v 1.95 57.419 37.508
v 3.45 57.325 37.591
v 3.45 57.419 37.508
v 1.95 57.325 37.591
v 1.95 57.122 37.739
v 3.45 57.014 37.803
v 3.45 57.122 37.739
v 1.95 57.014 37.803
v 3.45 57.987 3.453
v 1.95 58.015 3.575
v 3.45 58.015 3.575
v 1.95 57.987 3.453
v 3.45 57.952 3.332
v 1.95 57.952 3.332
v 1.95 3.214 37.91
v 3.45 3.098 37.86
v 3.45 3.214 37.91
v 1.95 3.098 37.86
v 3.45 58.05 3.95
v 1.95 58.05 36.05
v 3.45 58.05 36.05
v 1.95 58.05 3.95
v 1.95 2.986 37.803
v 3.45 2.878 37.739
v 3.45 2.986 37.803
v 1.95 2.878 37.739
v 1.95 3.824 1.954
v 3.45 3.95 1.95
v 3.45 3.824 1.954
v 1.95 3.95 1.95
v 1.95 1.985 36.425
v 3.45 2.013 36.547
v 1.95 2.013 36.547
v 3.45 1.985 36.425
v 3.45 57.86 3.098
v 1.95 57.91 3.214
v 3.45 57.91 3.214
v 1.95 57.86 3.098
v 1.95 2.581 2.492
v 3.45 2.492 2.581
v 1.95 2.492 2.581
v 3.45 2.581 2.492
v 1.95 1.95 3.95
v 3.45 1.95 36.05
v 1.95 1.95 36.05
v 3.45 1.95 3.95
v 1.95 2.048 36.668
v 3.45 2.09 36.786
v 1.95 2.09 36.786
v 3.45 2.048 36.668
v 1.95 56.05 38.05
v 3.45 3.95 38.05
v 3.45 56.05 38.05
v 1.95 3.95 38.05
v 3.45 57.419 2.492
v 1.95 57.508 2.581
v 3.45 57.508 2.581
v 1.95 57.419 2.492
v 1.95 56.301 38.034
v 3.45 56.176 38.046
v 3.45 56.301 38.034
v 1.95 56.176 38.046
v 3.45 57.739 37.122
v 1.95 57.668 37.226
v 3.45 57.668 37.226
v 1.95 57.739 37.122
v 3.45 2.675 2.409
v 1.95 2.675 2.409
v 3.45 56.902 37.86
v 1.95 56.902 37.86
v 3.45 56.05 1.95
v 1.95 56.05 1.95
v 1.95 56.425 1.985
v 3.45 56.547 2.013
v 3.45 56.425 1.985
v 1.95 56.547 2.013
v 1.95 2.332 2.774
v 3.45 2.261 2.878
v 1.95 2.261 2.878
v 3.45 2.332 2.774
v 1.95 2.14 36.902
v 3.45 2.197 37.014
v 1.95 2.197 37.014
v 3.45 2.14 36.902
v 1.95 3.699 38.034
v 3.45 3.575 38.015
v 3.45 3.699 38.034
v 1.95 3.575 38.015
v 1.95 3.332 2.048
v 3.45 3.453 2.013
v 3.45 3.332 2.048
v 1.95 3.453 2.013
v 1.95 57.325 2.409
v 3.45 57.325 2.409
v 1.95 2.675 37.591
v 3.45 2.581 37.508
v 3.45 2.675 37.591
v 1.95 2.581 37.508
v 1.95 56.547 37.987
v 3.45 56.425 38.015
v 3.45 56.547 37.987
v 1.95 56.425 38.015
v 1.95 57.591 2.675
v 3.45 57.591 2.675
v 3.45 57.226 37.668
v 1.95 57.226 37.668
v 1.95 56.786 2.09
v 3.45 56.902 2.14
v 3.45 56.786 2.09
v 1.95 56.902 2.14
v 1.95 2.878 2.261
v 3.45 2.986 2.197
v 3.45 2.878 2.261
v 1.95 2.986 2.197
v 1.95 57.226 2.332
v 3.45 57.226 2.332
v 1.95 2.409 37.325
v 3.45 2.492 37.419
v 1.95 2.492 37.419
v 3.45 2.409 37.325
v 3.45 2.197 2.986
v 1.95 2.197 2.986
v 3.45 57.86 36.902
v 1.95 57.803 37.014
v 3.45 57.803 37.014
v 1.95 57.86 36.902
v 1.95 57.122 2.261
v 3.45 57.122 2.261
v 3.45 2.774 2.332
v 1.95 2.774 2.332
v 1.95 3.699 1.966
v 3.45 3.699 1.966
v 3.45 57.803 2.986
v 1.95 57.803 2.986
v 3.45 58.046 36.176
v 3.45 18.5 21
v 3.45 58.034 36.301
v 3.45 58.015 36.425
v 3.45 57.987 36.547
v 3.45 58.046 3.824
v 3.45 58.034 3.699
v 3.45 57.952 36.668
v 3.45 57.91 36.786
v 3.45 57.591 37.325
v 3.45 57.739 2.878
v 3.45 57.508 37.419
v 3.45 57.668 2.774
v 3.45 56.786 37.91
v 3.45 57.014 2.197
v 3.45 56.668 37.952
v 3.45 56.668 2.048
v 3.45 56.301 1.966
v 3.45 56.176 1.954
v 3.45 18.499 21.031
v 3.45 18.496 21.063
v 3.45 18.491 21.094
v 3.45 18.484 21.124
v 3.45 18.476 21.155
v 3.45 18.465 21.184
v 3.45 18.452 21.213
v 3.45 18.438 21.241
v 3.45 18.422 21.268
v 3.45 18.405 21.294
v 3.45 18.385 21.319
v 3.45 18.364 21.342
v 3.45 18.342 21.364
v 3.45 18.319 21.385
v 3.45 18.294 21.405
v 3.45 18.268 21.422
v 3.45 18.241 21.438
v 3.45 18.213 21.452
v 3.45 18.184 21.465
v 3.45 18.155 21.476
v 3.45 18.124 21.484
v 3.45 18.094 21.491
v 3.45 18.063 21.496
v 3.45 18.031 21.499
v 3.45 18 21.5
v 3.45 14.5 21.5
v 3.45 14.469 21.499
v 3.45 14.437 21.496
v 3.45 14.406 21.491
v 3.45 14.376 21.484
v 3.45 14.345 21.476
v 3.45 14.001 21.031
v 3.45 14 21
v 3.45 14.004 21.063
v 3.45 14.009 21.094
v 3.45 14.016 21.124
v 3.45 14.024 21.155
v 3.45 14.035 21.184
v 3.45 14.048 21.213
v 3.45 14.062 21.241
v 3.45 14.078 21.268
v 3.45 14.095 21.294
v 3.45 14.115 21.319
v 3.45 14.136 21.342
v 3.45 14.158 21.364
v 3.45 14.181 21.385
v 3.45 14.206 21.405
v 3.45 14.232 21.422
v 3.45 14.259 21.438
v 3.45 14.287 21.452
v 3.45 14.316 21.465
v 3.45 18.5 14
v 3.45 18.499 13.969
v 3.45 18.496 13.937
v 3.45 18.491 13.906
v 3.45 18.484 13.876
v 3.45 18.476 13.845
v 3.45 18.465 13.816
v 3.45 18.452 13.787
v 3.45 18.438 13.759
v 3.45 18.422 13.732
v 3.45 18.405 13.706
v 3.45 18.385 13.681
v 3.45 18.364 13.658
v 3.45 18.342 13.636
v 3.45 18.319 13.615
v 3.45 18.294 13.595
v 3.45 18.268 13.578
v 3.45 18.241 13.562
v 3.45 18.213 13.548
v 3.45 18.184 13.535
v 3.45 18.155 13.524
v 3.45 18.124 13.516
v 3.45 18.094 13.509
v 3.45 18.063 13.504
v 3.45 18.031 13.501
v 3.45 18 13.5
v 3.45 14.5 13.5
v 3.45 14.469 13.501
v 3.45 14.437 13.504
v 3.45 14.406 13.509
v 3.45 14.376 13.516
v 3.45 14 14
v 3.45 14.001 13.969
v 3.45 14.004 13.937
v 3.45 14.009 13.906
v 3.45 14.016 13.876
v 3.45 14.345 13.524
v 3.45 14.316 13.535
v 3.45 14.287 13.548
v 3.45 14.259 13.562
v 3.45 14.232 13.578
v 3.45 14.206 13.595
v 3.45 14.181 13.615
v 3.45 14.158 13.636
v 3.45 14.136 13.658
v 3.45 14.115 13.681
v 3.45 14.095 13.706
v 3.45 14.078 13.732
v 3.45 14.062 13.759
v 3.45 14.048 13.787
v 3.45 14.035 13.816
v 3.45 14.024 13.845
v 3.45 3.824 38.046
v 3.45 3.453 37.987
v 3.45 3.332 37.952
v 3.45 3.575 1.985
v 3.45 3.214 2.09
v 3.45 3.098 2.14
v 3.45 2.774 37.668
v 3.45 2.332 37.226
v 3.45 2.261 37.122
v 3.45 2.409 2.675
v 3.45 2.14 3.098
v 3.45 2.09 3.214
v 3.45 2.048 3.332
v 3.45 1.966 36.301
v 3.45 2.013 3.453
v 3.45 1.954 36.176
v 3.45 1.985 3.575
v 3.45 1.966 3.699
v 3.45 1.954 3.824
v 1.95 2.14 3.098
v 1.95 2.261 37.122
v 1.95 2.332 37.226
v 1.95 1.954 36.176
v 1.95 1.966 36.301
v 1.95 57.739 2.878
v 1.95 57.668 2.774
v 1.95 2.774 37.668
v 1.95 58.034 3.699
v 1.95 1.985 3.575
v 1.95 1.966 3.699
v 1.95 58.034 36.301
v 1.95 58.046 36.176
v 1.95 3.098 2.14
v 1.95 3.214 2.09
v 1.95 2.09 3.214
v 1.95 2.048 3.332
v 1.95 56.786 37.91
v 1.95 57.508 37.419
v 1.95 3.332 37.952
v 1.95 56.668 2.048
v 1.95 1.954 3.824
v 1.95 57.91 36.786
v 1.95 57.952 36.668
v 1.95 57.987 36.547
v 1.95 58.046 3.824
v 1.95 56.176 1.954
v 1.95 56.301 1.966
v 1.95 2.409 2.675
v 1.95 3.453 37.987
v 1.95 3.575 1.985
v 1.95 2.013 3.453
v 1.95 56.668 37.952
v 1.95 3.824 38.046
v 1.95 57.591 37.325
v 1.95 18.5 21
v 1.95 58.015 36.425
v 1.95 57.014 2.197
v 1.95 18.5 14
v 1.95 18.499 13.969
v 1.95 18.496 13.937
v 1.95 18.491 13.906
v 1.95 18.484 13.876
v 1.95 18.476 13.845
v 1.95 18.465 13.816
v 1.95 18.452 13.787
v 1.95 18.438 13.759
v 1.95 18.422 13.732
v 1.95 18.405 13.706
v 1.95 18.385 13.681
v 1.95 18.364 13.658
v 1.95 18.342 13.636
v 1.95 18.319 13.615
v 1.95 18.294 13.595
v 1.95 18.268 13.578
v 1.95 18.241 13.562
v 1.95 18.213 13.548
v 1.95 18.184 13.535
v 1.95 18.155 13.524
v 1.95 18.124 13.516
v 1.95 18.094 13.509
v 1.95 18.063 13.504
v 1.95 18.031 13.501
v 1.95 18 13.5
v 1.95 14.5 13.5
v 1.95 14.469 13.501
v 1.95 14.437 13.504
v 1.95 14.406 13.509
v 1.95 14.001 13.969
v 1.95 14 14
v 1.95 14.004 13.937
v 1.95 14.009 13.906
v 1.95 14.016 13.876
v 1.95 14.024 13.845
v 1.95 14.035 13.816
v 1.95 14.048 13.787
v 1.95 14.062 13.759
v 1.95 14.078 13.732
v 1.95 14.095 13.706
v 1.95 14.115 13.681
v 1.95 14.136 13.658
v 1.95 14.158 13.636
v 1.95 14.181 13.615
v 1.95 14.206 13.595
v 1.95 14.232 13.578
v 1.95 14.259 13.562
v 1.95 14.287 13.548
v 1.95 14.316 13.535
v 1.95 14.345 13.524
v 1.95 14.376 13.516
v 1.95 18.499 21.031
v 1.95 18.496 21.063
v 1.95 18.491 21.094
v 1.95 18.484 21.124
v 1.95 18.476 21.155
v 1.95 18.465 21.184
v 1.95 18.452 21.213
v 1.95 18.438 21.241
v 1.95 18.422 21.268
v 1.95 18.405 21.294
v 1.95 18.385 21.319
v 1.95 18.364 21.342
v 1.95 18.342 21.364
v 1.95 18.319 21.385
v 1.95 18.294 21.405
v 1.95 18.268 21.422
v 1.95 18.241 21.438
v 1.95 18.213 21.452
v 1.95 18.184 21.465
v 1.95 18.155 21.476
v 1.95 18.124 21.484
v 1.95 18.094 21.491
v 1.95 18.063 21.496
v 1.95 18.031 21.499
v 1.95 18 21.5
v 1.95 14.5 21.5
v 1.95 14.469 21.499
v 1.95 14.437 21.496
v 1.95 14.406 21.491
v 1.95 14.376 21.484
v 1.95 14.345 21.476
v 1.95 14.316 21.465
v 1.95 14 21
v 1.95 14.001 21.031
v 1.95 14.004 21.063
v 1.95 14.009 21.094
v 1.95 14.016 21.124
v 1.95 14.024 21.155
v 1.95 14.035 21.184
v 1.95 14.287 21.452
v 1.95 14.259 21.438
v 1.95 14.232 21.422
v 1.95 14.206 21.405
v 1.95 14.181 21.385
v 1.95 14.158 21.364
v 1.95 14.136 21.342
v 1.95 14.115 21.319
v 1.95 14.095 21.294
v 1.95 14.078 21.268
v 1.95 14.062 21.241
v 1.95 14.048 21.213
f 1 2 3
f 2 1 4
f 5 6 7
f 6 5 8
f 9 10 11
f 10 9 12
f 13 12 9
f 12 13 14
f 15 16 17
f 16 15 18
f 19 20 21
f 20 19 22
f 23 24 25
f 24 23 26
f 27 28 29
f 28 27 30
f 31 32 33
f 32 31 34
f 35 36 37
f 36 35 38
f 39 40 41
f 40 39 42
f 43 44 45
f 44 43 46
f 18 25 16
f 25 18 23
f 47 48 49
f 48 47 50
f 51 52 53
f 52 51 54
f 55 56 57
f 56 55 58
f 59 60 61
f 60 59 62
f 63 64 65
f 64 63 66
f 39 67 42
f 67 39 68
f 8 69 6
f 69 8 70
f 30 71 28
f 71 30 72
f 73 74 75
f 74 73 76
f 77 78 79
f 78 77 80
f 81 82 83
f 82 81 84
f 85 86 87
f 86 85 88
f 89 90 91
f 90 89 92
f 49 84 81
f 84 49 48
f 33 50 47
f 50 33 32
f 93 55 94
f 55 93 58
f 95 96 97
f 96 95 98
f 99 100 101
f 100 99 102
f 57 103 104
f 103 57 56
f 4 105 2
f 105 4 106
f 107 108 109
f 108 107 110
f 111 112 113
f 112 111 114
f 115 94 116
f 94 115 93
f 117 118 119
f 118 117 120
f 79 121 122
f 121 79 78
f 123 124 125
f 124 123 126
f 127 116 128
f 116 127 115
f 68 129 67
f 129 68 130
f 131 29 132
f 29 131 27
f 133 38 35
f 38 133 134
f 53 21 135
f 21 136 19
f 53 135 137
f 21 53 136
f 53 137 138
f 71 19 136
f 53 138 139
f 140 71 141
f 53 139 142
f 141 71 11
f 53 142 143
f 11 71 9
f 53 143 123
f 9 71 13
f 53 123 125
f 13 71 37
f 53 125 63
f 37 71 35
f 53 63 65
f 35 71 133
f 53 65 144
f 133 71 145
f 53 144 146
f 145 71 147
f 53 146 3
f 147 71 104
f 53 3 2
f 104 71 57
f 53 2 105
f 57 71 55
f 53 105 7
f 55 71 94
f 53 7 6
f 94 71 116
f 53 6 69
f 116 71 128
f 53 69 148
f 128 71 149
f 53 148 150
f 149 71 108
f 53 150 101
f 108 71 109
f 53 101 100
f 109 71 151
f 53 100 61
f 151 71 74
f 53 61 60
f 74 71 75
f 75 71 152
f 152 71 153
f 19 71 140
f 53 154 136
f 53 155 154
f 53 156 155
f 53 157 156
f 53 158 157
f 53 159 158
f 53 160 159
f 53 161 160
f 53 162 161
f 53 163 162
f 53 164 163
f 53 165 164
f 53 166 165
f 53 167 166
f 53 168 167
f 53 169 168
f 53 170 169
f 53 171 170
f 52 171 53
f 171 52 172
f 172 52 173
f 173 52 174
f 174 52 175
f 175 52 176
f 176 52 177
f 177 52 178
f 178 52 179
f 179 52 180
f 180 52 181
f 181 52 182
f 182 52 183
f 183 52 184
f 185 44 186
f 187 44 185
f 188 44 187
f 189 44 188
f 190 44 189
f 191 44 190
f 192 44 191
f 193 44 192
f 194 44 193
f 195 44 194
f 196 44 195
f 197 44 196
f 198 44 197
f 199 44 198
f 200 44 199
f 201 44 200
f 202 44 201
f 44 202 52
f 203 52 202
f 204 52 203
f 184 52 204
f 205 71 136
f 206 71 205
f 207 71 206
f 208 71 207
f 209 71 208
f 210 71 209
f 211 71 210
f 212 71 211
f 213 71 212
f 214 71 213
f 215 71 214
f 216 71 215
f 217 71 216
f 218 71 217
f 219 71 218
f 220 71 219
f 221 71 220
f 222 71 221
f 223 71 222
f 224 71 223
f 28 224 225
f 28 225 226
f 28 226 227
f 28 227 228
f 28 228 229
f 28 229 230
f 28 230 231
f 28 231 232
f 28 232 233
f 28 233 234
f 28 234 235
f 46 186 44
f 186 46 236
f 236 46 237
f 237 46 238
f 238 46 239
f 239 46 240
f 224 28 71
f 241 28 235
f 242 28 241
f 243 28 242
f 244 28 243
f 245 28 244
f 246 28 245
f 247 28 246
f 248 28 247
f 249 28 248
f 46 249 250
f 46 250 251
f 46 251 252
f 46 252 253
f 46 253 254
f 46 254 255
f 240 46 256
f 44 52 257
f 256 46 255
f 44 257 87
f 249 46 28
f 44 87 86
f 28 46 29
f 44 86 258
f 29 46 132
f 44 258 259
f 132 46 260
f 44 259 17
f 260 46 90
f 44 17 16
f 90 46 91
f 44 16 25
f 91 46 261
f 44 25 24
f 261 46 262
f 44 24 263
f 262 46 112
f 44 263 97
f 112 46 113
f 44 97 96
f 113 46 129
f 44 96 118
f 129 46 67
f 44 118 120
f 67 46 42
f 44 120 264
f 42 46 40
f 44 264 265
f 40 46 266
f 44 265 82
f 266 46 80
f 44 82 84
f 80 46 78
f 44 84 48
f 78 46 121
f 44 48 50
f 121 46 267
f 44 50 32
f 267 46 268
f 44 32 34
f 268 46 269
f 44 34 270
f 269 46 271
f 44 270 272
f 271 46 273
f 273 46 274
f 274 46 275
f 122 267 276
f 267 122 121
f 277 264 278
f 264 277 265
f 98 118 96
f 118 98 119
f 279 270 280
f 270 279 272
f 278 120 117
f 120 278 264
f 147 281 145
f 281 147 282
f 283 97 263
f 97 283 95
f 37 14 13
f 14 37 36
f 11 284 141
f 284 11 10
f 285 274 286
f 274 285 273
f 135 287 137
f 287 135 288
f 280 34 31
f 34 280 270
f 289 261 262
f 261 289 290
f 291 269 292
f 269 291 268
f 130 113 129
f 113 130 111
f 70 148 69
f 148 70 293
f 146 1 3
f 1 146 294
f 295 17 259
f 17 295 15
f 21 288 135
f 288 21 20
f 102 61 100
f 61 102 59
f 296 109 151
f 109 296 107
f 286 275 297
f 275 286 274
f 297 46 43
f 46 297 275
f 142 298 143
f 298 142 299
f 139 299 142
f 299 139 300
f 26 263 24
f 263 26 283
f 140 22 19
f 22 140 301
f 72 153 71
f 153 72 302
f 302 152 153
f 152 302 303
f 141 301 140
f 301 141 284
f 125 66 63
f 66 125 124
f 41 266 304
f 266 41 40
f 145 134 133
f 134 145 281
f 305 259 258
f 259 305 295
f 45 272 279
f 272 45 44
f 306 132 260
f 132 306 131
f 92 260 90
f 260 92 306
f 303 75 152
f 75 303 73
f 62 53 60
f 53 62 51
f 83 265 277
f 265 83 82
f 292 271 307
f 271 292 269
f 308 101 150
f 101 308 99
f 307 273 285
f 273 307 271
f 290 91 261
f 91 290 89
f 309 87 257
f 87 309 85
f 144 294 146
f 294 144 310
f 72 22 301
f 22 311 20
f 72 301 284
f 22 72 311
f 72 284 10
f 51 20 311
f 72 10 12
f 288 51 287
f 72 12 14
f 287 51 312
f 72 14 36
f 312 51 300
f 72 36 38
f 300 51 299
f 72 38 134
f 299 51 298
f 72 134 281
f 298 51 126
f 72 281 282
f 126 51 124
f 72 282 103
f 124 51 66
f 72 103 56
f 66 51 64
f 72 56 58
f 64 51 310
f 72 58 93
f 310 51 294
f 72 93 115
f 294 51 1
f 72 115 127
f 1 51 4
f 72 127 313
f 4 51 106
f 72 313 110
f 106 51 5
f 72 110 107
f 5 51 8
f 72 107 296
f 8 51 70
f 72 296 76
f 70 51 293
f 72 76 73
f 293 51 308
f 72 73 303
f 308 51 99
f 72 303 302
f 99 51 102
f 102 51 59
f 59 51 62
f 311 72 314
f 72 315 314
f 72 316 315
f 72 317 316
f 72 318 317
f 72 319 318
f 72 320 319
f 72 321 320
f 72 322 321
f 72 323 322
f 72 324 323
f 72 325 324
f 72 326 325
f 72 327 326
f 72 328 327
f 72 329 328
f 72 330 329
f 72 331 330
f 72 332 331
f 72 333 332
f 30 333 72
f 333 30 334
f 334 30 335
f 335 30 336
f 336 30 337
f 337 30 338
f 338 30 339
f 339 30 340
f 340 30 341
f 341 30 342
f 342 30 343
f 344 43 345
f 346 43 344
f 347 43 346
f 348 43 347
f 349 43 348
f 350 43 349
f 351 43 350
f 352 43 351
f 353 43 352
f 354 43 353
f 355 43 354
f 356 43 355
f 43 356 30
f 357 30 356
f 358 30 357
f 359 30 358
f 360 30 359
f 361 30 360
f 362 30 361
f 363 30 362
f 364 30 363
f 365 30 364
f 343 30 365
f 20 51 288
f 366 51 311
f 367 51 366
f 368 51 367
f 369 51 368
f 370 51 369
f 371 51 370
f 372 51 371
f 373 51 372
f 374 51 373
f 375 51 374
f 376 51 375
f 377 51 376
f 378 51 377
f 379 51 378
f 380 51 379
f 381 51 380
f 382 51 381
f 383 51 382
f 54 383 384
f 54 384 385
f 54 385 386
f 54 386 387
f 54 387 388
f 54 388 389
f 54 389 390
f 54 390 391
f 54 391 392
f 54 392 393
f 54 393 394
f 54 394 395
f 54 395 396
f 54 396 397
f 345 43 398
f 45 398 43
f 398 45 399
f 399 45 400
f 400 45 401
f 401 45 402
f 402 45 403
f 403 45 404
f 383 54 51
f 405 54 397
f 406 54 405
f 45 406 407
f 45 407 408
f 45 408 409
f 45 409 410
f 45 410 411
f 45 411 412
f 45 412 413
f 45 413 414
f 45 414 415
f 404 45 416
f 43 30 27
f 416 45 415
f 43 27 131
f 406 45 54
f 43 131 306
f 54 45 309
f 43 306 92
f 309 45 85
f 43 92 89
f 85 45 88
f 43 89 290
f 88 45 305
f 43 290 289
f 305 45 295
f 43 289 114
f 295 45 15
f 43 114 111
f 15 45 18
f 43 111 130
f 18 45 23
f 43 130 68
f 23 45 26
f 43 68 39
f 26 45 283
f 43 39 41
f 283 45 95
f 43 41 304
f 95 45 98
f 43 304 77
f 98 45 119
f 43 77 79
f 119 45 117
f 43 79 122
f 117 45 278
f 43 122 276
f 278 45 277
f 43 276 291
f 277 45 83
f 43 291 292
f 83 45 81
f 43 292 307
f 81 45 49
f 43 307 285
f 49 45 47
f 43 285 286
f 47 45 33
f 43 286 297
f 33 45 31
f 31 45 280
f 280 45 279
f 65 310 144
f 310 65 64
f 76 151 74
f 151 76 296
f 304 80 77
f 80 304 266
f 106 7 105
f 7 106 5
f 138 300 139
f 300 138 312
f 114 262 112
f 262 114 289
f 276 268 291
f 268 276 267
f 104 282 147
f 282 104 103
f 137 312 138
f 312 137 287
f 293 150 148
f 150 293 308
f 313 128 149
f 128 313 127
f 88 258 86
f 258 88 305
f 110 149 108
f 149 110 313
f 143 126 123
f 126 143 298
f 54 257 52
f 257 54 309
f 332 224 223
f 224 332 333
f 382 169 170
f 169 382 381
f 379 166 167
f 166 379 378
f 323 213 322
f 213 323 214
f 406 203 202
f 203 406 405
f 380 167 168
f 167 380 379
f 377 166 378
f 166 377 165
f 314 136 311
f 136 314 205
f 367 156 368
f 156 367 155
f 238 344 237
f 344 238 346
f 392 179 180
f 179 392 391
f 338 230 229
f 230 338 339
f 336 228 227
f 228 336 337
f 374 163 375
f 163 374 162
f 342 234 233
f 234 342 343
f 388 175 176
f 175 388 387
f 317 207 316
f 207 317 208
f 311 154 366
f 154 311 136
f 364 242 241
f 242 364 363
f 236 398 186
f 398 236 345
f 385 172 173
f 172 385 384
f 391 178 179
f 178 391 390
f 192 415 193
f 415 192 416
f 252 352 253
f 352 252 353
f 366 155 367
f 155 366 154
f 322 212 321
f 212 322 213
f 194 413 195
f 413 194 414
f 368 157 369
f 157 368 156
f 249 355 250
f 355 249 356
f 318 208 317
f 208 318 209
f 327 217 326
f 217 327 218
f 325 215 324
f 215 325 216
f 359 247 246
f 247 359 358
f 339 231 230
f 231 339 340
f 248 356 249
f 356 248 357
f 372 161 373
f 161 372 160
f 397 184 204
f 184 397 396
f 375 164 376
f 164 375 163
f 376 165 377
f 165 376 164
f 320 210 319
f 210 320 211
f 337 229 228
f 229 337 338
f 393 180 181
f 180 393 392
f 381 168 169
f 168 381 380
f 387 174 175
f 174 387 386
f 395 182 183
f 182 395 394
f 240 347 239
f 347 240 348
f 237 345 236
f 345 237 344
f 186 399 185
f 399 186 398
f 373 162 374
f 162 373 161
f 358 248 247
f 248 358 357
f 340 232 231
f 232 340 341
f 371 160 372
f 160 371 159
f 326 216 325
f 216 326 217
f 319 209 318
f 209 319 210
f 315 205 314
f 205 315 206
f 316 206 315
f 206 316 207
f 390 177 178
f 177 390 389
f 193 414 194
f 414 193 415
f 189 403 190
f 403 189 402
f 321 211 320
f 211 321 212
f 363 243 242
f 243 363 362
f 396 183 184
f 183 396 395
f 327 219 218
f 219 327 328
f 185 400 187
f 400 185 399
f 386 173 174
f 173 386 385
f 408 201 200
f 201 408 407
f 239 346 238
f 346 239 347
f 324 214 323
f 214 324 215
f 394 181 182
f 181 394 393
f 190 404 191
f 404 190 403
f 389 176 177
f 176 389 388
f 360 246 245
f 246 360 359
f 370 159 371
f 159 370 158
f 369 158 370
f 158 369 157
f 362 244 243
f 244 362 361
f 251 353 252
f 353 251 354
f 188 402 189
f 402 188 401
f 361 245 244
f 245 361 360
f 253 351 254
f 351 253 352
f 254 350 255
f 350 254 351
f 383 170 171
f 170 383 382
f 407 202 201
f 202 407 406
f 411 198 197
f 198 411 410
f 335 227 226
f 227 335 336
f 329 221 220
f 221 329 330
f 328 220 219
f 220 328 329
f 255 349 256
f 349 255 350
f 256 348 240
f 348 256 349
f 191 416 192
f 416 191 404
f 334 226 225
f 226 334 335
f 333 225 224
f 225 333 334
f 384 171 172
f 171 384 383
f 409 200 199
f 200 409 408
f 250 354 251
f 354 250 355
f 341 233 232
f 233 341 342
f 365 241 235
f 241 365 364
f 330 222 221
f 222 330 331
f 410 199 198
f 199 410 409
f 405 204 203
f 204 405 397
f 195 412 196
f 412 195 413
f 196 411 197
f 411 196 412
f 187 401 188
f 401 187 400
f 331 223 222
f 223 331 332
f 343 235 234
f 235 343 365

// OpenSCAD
/*//////////////////////////////////////////////////////////////////
              -    FB Aka Heartman/Hearty 2016     -                   
              -   http://heartygfx.blogspot.com    -                  
              -       OpenScad Parametric Box      -                     
              -         CC BY-NC 3.0 License       -                      
////////////////////////////////////////////////////////////////////                                                                                                             
12/02/2016 - Fixed minor bug 
28/02/2016 - Added holes ventilation option                    
09/03/2016 - Added PCB feet support, fixed the shell artefact on export mode. 

*/////////////////////////// - Info - //////////////////////////////

// All coordinates are starting as integrated circuit pins.
// From the top view :

//   CoordD           <---       CoordC
//                                 ^
//                                 ^
//                                 ^
//   CoordA           --->       CoordB


////////////////////////////////////////////////////////////////////


////////// - Paramètres de la boite - Box parameters - /////////////

/* [Box dimensions] */
// - Longueur - Length  
  Length        = 70;
// - Largeur - Width
  Width         = 60;                     
// - Hauteur - Height  
  Height        = 40;  
// - Epaisseur - Wall thickness  
  Thick         = 1.5;//[2:5]  
  
/* [Box options] */
// - Diamètre Coin arrondi - Filet diameter  
  Filet         = 2;//[0.1:12] 
// - lissage de l'arrondi - Filet smoothness  
  Resolution    = 50;//[1:100] 
// - Tolérance - Tolerance (Panel/rails gap)
  m             = 0.9;
// Pieds PCB - PCB feet (x4) 
  PCBFeet       = 0;// [0:No, 1:Yes]
// - Decorations to ventilation holes
  Vent          = 1;// [0:No, 1:Yes]
// - Decoration-Holes width (in mm)
  Vent_width    = 1.5;   


  
/* [PCB_Feet] */
//All dimensions are from the center foot axis

// - Coin bas gauche - Low left corner X position
PCBPosX         = 1;
// - Coin bas gauche - Low left corner Y position
PCBPosY         = 1;
// - Longueur PCB - PCB Length
PCBLength       = 45;
// - Largeur PCB - PCB Width
PCBWidth        = 44.3;
// - Heuteur pied - Feet height
FootHeight      = 3;
// - Diamètre pied - Foot diameter
FootDia         = 5;
// - Diamètre trou - Hole diameter
FootHole        = 2;  
  

/* [STL element to export] */
//Coque haut - Top shell
TShell          = 0;// [0:No, 1:Yes]
//Coque bas- Bottom shell
BShell          = 0;// [0:No, 1:Yes]
//Panneau avant - Front panel
FPanL           = 0;// [0:No, 1:Yes]
//Panneau arrière - Back panel  
BPanL           = 1;// [0:No, 1:Yes]


  
/* [Hidden] */
// - Couleur coque - Shell color  
Couleur1        = "Orange";       
// - Couleur panneaux - Panels color    
Couleur2        = "OrangeRed";    
// Thick X 2 - making decorations thicker if it is a vent to make sure they go through shell
Dec_Thick       = Vent ? Thick*2 : Thick; 
// - Depth decoration
Dec_size        = Vent ? Thick*2 : 0.8;





/////////// - Boitier générique bord arrondis - Generic rounded box - //////////

module RoundBox($a=Length, $b=Width, $c=Height){// Cube bords arrondis
                    $fn=Resolution;            
                    translate([0,Filet,Filet]){  
                    minkowski (){                                              
                        cube ([$a-(Length/2),$b-(2*Filet),$c-(2*Filet)], center = false);
                        rotate([0,90,0]){    
                        cylinder(r=Filet,h=Length/2, center = false);
                            } 
                        }
                    }
                }// End of RoundBox Module

      
////////////////////////////////// - Module Coque/Shell - //////////////////////////////////         

module Coque(){//Coque - Shell  
    Thick = Thick*2;  
    difference(){    
        difference(){//sides decoration
            union(){    
                     difference() {//soustraction de la forme centrale - Substraction Fileted box
                      
                        difference(){//soustraction cube median - Median cube slicer
                            union() {//union               
                            difference(){//Coque    
                                RoundBox();
                                translate([Thick/2,Thick/2,Thick/2]){     
                                        RoundBox($a=Length-Thick, $b=Width-Thick, $c=Height-Thick);
                                        }
                                        }//Fin diff Coque                            
                                difference(){//largeur Rails        
                                     translate([Thick+m,Thick/2,Thick/2]){// Rails
                                          RoundBox($a=Length-((2*Thick)+(2*m)), $b=Width-Thick, $c=Height-(Thick*2));
                                                          }//fin Rails
                                     translate([((Thick+m/2)*1.55),Thick/2,Thick/2+0.1]){ // +0.1 added to avoid the artefact
                                          RoundBox($a=Length-((Thick*3)+2*m), $b=Width-Thick, $c=Height-Thick);
                                                    }           
                                                }//Fin largeur Rails
                                    }//Fin union                                   
                               translate([-Thick,-Thick,Height/2]){// Cube à soustraire
                                    cube ([Length+100, Width+100, Height], center=false);
                                            }                                            
                                      }//fin soustraction cube median - End Median cube slicer
                               translate([-Thick/2,Thick,Thick]){// Forme de soustraction centrale 
                                    RoundBox($a=Length+Thick, $b=Width-Thick*2, $c=Height-Thick);       
                                    }                          
                                }                                          


                difference(){// wall fixation box legs
                    union(){
                        translate([3*Thick +5,Thick,Height/2]){
                            rotate([90,0,0]){
                                    $fn=6;
                                    cylinder(d=16,Thick/2);
                                    }   
                            }
                            
                       translate([Length-((3*Thick)+5),Thick,Height/2]){
                            rotate([90,0,0]){
                                    $fn=6;
                                    cylinder(d=16,Thick/2);
                                    }   
                            }

                        }
                            translate([4,Thick+Filet,Height/2-57]){   
                             rotate([45,0,0]){
                                   cube([Length,40,40]);    
                                  }
                           }
                           translate([0,-(Thick*1.46),Height/2]){
                                cube([Length,Thick*2,10]);
                           }
                    } //Fin fixation box legs
            }

        union(){// outbox sides decorations
            
            for(i=[0:Thick:Length/4]){

                // Ventilation holes part code submitted by Ettie - Thanks ;) 
                    translate([10+i,-Dec_Thick+Dec_size,1]){
                    cube([Vent_width,Dec_Thick,Height/4]);
                    }
                    translate([(Length-10) - i,-Dec_Thick+Dec_size,1]){
                    cube([Vent_width,Dec_Thick,Height/4]);
                    }
                    translate([(Length-10) - i,Width-Dec_size,1]){
                    cube([Vent_width,Dec_Thick,Height/4]);
                    }
                    translate([10+i,Width-Dec_size,1]){
                    cube([Vent_width,Dec_Thick,Height/4]);
                    }
  
                
                    }// fin de for
               // }
                }//fin union decoration
            }//fin difference decoration


            union(){ //sides holes
                $fn=50;
                translate([3*Thick+5,20,Height/2+4]){
                    rotate([90,0,0]){
                    cylinder(d=2,20);
                    }
                }
                translate([Length-((3*Thick)+5),20,Height/2+4]){
                    rotate([90,0,0]){
                    cylinder(d=2,20);
                    }
                }
                translate([3*Thick+5,Width+5,Height/2-4]){
                    rotate([90,0,0]){
                    cylinder(d=2,20);
                    }
                }
                translate([Length-((3*Thick)+5),Width+5,Height/2-4]){
                    rotate([90,0,0]){
                    cylinder(d=2,20);
                    }
                }
            }//fin de sides holes

        }//fin de difference holes
}// fin coque 

////////////////////////////// - Experiment - ///////////////////////////////////////////





/////////////////////// - Foot with base filet - /////////////////////////////
module foot(FootDia,FootHole,FootHeight){
    Filet=2;
    color(Couleur1)   
    translate([0,0,Filet-1.5])
    difference(){
    
    difference(){
            //translate ([0,0,-Thick]){
                cylinder(d=FootDia+Filet,FootHeight-Thick, $fn=100);
                        //}
                    rotate_extrude($fn=100){
                            translate([(FootDia+Filet*2)/2,Filet,0]){
                                    minkowski(){
                                            square(10);
                                            circle(Filet, $fn=100);
                                        }
                                 }
                           }
                   }
            cylinder(d=FootHole,FootHeight+1, $fn=100);
               }          
}// Fin module foot
  
module Feet(){     
//////////////////// - PCB only visible in the preview mode - /////////////////////    
    translate([3*Thick+2,Thick+5,FootHeight+(Thick/2)-0.5]){
    
    %square ([PCBLength+10,PCBWidth+10]);
       translate([PCBLength/2,PCBWidth/2,0.5]){ 
        color("Olive")
        %text("PCB", halign="center", valign="center", font="Arial black");
       }
    } // Fin PCB 
  
    
////////////////////////////// - 4 Feet - //////////////////////////////////////////     
    translate([3*Thick+7,Thick+10,Thick/2]){
        foot(FootDia,FootHole,FootHeight);
    }
    translate([(3*Thick)+PCBLength+7,Thick+10,Thick/2]){
        foot(FootDia,FootHole,FootHeight);
        }
    translate([(3*Thick)+PCBLength+7,(Thick)+PCBWidth+10,Thick/2]){
        foot(FootDia,FootHole,FootHeight);
        }        
    translate([3*Thick+7,(Thick)+PCBWidth+10,Thick/2]){
        foot(FootDia,FootHole,FootHeight);
    }   

} // Fin du module Feet
 


 
 ////////////////////////////////////////////////////////////////////////
////////////////////// <- Holes Panel Manager -> ///////////////////////
////////////////////////////////////////////////////////////////////////

//                           <- Panel ->  
module Panel(Length,Width,Thick,Filet){
    scale([0.5,1,1])
    minkowski(){
            cube([Thick,Width-(Thick*2+Filet*2+m),Height-(Thick*2+Filet*2+m)]);
            translate([0,Filet,Filet])
            rotate([0,90,0])
            cylinder(r=Filet,h=Thick, $fn=100);
      }
}



//                          <- Circle hole -> 
// Cx=Cylinder X position | Cy=Cylinder Y position | Cdia= Cylinder dia | Cheight=Cyl height
module CylinderHole(OnOff,Cx,Cy,Cdia){
    if(OnOff==1)
    translate([Cx,Cy,-1])
        cylinder(d=Cdia,10, $fn=50);
}
//                          <- Square hole ->  
// Sx=Square X position | Sy=Square Y position | Sl= Square Length | Sw=Square Width | Filet = Round corner
module SquareHole(OnOff,Sx,Sy,Sl,Sw,Filet){
    if(OnOff==1)
     minkowski(){
        translate([Sx+Filet/2,Sy+Filet/2,-1])
            cube([Sl-Filet,Sw-Filet,10]);
            cylinder(d=Filet,h=10, $fn=100);
       }
}


 
//                      <- Linear text panel -> 
module LText(OnOff,Tx,Ty,Font,Size,Content){
    if(OnOff==1)
    translate([Tx,Ty,Thick+.5])
    linear_extrude(height = 0.5){
    text(Content, size=Size, font=Font);
    }
}
//                     <- Circular text panel->  
module CText(OnOff,Tx,Ty,Font,Size,TxtRadius,Angl,Turn,Content){ 
      if(OnOff==1) {
      Angle = -Angl / len(Content);
      translate([Tx,Ty,Thick+.5])
          for (i= [0:len(Content)-1] ){   
              rotate([0,0,i*Angle+90+Turn])
              translate([0,TxtRadius,0]) {
                linear_extrude(height = 0.5){
                text(Content[i], font = Font, size = Size,  valign ="baseline", halign ="center");
                    }
                }   
             }
      }
}
////////////////////// <- New module Panel -> //////////////////////
module FPanL(){
    difference(){
        color(Couleur2)
        Panel(Length,Width,Thick,Filet);
    
 
    rotate([90,0,90]){
        color(Couleur2){
            
        CylinderHole(1,15.3,18,16.5);       //(On/Off, Xpos, Ypos, Diameter)
        CylinderHole(1,41.3,18,16.5);       //(On/Off, Xpos, Ypos, Diameter)
//                            <- To here -> 
           }
       }
}

    color(Couleur1){
        translate ([-.5,0,0])
        rotate([90,0,90]){
//                      <- Adding text from here ->          
//        LText(1,43,13,"Arial Black",3,"GPS");//(On/Off, Xpos, Ypos, "Font", Size, "Text")
//        LText(1,41,6,"Arial Black",3,"Clock");            
//                            <- To here ->
            }
      }
}


/////////////////////////// <- Main part -> /////////////////////////

if(TShell==1) {
// Coque haut - Top Shell
    difference() {
        color( Couleur1,1){
            translate([0,Width,Height+0.2]){
                rotate([0,180,180]){
                        Coque();
                        }
                }
        }

    color(Couleur2){

    translate ([26,19,38]){rotate([0,0,90]){cube(size=[31,15,6], center = false);}}
    }
    }
}
if(BShell==1)
{
// Coque bas - Bottom shell
        color(Couleur1){ 
        Coque();
        }

    color(Couleur2){
        translate ([50,90,1.8])
        rotate([0,180,90]){
            }
      }


}
// Pied support PCB - PCB feet
if (PCBFeet==1)
// Feet
        translate([PCBPosX,PCBPosY,0]){ 
        Feet();
        }

// Panneau avant - Front panel  <<<<<< Text and holes only on this one.
//rotate([0,-90,-90]) 
if(FPanL==1)
        translate([Length-(Thick*2+m/2),Thick+m/2,Thick+m/2])
        FPanL();

//Panneau arrière - Back panel
if(BPanL==1) {
difference() { 

    difference() { 
        color(Couleur2)
        translate([Thick+m/2,Thick+m/2,Thick+m/2])
        Panel(Length,Width,Thick,Filet);
    
        rotate([90,0,90]){
            color(Couleur1)
            SquareHole  (1,14,13.5,4.5,8,1); //(On/Off, Xpos,Ypos,Length,Width,Filet)
        }
    }    


}


}
